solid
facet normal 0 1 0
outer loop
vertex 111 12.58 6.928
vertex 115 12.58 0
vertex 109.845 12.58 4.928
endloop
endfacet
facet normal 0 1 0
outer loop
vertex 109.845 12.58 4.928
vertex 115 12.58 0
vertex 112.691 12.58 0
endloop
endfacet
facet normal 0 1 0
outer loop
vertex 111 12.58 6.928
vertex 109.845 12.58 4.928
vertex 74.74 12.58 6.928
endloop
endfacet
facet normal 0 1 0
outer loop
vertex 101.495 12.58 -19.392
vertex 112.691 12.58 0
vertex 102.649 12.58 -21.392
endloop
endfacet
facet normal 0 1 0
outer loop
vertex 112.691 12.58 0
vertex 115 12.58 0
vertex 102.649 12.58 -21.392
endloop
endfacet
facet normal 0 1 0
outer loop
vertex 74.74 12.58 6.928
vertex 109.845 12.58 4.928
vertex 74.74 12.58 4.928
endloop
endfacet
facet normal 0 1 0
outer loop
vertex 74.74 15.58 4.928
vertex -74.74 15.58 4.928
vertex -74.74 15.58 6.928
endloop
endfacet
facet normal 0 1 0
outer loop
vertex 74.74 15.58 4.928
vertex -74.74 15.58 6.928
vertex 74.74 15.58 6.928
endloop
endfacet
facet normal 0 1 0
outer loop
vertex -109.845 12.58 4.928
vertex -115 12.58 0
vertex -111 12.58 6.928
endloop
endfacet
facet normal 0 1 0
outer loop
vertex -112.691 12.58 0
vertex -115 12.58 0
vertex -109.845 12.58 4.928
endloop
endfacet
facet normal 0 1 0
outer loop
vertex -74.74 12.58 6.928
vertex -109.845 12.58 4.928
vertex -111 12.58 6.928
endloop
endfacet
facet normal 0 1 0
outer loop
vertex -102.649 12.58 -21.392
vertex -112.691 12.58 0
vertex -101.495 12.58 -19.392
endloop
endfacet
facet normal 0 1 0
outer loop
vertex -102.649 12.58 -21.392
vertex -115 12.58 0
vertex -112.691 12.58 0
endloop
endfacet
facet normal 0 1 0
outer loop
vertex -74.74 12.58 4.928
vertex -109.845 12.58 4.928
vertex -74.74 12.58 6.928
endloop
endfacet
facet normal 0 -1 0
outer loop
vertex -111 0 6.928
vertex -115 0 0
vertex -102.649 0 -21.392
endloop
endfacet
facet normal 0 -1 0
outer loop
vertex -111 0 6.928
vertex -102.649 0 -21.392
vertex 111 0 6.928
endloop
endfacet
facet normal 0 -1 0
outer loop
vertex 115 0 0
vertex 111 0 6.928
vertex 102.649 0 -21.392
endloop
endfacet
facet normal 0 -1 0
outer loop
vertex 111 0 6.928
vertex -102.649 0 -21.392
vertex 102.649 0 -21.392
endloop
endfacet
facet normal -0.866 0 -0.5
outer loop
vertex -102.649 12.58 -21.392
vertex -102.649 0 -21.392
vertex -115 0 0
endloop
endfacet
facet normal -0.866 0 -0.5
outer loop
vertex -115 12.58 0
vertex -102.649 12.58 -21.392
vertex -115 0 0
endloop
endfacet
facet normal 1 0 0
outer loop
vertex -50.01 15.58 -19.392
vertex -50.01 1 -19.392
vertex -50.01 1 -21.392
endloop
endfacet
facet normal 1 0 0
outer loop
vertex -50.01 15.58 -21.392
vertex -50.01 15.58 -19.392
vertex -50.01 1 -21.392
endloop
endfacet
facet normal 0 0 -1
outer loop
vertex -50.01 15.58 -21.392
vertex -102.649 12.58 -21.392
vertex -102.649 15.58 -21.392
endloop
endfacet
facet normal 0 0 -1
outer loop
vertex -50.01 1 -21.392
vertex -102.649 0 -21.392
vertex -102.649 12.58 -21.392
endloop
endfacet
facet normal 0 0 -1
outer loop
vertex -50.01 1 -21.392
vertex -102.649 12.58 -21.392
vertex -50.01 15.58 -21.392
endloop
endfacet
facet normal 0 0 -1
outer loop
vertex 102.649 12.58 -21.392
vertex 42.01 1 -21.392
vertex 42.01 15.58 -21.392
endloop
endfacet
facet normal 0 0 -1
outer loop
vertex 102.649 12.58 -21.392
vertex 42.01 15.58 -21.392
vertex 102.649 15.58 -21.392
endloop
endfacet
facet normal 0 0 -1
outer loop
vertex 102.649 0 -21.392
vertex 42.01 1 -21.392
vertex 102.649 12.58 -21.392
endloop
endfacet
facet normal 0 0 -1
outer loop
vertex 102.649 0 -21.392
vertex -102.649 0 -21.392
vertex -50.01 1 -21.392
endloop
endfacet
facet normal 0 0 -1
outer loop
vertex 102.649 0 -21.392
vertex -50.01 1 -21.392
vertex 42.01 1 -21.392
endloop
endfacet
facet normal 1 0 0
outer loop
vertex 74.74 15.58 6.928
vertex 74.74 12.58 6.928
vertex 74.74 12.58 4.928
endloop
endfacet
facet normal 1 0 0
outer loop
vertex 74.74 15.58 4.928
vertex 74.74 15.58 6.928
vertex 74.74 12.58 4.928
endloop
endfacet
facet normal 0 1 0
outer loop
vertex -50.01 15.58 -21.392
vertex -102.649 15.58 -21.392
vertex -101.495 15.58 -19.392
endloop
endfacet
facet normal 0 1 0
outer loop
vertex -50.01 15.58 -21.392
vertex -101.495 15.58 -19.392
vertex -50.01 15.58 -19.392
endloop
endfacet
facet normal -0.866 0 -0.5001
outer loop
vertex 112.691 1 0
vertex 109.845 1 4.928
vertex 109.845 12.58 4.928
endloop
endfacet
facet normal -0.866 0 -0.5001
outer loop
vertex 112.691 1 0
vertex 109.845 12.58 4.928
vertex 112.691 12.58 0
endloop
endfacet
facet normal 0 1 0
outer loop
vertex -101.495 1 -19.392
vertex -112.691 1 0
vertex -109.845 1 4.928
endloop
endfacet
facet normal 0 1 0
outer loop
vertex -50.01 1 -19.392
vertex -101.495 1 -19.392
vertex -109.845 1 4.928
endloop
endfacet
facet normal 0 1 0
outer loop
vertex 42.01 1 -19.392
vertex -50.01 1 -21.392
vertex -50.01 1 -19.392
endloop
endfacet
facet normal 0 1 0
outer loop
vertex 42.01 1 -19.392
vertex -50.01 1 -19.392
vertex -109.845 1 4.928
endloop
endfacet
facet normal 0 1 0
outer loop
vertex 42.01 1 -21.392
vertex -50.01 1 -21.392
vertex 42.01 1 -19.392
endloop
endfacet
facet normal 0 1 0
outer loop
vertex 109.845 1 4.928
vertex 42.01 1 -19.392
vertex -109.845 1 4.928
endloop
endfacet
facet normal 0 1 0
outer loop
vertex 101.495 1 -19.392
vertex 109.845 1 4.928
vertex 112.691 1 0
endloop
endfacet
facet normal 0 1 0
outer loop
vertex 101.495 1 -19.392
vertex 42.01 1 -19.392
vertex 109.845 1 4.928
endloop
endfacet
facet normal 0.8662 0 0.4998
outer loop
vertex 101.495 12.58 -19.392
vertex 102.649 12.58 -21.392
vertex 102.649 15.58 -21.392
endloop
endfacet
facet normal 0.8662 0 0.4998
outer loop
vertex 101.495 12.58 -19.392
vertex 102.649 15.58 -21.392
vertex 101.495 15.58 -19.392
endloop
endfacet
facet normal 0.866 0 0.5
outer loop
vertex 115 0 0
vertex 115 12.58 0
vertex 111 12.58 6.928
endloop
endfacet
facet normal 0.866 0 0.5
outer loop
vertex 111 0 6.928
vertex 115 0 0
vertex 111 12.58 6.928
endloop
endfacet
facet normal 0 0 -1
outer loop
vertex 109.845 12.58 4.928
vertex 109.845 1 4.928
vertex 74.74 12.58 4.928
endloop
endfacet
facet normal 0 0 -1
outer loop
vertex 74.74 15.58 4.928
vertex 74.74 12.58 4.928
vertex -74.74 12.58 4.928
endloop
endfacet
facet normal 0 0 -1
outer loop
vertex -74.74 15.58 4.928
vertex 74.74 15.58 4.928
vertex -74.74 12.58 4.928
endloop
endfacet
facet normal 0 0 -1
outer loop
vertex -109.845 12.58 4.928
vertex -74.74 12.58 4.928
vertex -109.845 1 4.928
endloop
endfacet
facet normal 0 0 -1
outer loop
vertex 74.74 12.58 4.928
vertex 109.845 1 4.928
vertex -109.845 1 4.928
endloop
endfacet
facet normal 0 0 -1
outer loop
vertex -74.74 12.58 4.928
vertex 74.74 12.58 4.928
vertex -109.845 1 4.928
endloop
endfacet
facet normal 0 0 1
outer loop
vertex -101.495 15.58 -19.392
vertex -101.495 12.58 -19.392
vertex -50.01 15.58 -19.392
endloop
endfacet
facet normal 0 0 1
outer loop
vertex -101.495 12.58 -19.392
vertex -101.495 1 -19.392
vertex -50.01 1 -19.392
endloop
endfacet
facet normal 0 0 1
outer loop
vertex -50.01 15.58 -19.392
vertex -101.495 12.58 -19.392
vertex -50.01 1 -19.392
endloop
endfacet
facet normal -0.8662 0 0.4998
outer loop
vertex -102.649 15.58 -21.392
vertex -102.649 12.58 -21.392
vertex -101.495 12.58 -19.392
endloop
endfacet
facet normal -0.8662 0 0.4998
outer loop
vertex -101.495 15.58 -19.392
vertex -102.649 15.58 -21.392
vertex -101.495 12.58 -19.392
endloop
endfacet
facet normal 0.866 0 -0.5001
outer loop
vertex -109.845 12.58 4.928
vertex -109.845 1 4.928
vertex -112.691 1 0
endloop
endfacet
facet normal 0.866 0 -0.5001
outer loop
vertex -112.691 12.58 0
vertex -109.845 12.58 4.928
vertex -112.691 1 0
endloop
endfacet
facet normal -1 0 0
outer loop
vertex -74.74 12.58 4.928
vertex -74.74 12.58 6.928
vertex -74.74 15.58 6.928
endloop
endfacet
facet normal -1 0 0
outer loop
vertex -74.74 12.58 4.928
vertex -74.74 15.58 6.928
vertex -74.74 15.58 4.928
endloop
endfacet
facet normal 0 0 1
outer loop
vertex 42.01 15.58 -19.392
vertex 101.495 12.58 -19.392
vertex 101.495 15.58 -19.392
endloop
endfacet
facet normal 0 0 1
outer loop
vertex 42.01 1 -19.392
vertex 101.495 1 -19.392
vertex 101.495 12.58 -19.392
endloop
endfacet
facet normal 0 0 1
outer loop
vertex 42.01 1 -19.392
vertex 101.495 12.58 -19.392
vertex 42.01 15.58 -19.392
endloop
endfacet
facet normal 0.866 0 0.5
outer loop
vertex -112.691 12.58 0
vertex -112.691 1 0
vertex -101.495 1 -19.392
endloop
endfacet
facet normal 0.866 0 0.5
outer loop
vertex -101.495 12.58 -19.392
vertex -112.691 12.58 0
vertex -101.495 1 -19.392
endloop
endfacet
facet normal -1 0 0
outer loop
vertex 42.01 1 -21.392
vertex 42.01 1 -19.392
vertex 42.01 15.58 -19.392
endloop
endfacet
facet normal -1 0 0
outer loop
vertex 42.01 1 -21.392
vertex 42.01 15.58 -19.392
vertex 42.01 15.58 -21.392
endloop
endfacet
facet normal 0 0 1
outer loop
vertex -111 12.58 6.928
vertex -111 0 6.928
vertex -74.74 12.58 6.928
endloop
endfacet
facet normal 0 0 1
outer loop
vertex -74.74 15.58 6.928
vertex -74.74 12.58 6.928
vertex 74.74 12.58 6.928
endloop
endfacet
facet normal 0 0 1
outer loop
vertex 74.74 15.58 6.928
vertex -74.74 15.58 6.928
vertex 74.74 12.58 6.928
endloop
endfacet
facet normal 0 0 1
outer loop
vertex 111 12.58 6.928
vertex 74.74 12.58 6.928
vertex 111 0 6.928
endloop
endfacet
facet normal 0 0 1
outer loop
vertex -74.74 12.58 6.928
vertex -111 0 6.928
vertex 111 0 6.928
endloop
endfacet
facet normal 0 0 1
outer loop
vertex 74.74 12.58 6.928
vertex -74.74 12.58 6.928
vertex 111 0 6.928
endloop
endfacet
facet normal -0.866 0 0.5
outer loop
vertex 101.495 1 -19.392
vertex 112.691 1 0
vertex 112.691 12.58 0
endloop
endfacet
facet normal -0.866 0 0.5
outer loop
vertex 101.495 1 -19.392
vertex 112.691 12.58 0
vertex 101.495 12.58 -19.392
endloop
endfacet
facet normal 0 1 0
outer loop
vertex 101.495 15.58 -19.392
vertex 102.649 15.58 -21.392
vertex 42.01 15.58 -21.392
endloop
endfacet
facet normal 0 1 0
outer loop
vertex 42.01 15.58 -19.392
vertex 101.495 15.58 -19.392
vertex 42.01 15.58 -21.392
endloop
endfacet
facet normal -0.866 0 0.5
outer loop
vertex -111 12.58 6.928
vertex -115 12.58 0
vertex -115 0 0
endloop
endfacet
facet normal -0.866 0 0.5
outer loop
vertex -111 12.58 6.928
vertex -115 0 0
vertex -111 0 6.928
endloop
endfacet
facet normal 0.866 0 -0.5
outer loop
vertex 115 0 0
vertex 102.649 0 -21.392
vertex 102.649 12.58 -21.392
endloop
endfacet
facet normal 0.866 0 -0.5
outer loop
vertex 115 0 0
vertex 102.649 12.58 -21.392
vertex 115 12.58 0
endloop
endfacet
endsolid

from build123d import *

# Parameters (mm, degrees)
BOSS_EXTRUDE1_DEPTH = 1
BOSS_EXTRUDE2_DEPTH = 12.58
SKETCH1_4_W         = 149.48
SKETCH1_4_H         = 2
BOSS_EXTRUDE3_DEPTH = 15.58
SKETCH1_5_W         = 92.02
SKETCH1_5_H         = 2
BOSS_EXTRUDE4_DEPTH = 1


with BuildPart() as part:
    # Sketch1 → Boss-Extrude1 (new body)
    with BuildSketch(Plane(origin=(0, 0, 0), x_dir=(1, 0, 0), z_dir=(0, 1, 0))):
        Polygon((-50.01, 19.39179677), (-101.494739838, 19.39179677), (-112.690598923, 0), (-109.845299462, -4.92820323), (-74.74, -4.92820323), (74.74, -4.92820323), (109.845299462, -4.92820323), (112.690598923, 0), (101.494739838, 19.39179677), (42.01, 19.39179677), align=None)
    extrude(amount=BOSS_EXTRUDE1_DEPTH)

    # Sketch1<3> → Boss-Extrude2 (add)
    with BuildSketch(Plane(origin=(0, 0, 0), x_dir=(1, 0, 0), z_dir=(0, 1, 0))):
        Polygon((-115, 0), (-111, -6.92820323), (-74.74, -6.92820323), (-74.74, -4.92820323), (-109.845299462, -4.92820323), (-112.690598923, 0), (-101.494739838, 19.39179677), (-102.649440377, 21.39179677), align=None)
        Polygon((115, 0), (111, -6.92820323), (74.74, -6.92820323), (74.74, -4.92820323), (109.845299462, -4.92820323), (112.690598923, 0), (101.494739838, 19.39179677), (102.649440377, 21.39179677), align=None)
    extrude(amount=BOSS_EXTRUDE2_DEPTH)

    # Sketch1<4> → Boss-Extrude3 (add)
    with BuildSketch(Plane(origin=(0, 0, 0), x_dir=(1, 0, 0), z_dir=(0, 1, 0))):
        Polygon((-102.649440377, 21.39179677), (-101.494739838, 19.39179677), (-50.01, 19.39179677), (-50.01, 21.39179677), align=None)
        Polygon((102.649440377, 21.39179677), (101.494739838, 19.39179677), (42.01, 19.39179677), (42.01, 21.39179677), align=None)
        with Locations((0, -5.92820323)):
            Rectangle(SKETCH1_4_W, SKETCH1_4_H)
    extrude(amount=BOSS_EXTRUDE3_DEPTH)

    # Sketch1<5> → Boss-Extrude4 (add)
    with BuildSketch(Plane(origin=(0, 0, 0), x_dir=(1, 0, 0), z_dir=(0, 1, 0))):
        with Locations((-4, 20.39179677)):
            Rectangle(SKETCH1_5_W, SKETCH1_5_H)
    extrude(amount=BOSS_EXTRUDE4_DEPTH)


solid = part.part
